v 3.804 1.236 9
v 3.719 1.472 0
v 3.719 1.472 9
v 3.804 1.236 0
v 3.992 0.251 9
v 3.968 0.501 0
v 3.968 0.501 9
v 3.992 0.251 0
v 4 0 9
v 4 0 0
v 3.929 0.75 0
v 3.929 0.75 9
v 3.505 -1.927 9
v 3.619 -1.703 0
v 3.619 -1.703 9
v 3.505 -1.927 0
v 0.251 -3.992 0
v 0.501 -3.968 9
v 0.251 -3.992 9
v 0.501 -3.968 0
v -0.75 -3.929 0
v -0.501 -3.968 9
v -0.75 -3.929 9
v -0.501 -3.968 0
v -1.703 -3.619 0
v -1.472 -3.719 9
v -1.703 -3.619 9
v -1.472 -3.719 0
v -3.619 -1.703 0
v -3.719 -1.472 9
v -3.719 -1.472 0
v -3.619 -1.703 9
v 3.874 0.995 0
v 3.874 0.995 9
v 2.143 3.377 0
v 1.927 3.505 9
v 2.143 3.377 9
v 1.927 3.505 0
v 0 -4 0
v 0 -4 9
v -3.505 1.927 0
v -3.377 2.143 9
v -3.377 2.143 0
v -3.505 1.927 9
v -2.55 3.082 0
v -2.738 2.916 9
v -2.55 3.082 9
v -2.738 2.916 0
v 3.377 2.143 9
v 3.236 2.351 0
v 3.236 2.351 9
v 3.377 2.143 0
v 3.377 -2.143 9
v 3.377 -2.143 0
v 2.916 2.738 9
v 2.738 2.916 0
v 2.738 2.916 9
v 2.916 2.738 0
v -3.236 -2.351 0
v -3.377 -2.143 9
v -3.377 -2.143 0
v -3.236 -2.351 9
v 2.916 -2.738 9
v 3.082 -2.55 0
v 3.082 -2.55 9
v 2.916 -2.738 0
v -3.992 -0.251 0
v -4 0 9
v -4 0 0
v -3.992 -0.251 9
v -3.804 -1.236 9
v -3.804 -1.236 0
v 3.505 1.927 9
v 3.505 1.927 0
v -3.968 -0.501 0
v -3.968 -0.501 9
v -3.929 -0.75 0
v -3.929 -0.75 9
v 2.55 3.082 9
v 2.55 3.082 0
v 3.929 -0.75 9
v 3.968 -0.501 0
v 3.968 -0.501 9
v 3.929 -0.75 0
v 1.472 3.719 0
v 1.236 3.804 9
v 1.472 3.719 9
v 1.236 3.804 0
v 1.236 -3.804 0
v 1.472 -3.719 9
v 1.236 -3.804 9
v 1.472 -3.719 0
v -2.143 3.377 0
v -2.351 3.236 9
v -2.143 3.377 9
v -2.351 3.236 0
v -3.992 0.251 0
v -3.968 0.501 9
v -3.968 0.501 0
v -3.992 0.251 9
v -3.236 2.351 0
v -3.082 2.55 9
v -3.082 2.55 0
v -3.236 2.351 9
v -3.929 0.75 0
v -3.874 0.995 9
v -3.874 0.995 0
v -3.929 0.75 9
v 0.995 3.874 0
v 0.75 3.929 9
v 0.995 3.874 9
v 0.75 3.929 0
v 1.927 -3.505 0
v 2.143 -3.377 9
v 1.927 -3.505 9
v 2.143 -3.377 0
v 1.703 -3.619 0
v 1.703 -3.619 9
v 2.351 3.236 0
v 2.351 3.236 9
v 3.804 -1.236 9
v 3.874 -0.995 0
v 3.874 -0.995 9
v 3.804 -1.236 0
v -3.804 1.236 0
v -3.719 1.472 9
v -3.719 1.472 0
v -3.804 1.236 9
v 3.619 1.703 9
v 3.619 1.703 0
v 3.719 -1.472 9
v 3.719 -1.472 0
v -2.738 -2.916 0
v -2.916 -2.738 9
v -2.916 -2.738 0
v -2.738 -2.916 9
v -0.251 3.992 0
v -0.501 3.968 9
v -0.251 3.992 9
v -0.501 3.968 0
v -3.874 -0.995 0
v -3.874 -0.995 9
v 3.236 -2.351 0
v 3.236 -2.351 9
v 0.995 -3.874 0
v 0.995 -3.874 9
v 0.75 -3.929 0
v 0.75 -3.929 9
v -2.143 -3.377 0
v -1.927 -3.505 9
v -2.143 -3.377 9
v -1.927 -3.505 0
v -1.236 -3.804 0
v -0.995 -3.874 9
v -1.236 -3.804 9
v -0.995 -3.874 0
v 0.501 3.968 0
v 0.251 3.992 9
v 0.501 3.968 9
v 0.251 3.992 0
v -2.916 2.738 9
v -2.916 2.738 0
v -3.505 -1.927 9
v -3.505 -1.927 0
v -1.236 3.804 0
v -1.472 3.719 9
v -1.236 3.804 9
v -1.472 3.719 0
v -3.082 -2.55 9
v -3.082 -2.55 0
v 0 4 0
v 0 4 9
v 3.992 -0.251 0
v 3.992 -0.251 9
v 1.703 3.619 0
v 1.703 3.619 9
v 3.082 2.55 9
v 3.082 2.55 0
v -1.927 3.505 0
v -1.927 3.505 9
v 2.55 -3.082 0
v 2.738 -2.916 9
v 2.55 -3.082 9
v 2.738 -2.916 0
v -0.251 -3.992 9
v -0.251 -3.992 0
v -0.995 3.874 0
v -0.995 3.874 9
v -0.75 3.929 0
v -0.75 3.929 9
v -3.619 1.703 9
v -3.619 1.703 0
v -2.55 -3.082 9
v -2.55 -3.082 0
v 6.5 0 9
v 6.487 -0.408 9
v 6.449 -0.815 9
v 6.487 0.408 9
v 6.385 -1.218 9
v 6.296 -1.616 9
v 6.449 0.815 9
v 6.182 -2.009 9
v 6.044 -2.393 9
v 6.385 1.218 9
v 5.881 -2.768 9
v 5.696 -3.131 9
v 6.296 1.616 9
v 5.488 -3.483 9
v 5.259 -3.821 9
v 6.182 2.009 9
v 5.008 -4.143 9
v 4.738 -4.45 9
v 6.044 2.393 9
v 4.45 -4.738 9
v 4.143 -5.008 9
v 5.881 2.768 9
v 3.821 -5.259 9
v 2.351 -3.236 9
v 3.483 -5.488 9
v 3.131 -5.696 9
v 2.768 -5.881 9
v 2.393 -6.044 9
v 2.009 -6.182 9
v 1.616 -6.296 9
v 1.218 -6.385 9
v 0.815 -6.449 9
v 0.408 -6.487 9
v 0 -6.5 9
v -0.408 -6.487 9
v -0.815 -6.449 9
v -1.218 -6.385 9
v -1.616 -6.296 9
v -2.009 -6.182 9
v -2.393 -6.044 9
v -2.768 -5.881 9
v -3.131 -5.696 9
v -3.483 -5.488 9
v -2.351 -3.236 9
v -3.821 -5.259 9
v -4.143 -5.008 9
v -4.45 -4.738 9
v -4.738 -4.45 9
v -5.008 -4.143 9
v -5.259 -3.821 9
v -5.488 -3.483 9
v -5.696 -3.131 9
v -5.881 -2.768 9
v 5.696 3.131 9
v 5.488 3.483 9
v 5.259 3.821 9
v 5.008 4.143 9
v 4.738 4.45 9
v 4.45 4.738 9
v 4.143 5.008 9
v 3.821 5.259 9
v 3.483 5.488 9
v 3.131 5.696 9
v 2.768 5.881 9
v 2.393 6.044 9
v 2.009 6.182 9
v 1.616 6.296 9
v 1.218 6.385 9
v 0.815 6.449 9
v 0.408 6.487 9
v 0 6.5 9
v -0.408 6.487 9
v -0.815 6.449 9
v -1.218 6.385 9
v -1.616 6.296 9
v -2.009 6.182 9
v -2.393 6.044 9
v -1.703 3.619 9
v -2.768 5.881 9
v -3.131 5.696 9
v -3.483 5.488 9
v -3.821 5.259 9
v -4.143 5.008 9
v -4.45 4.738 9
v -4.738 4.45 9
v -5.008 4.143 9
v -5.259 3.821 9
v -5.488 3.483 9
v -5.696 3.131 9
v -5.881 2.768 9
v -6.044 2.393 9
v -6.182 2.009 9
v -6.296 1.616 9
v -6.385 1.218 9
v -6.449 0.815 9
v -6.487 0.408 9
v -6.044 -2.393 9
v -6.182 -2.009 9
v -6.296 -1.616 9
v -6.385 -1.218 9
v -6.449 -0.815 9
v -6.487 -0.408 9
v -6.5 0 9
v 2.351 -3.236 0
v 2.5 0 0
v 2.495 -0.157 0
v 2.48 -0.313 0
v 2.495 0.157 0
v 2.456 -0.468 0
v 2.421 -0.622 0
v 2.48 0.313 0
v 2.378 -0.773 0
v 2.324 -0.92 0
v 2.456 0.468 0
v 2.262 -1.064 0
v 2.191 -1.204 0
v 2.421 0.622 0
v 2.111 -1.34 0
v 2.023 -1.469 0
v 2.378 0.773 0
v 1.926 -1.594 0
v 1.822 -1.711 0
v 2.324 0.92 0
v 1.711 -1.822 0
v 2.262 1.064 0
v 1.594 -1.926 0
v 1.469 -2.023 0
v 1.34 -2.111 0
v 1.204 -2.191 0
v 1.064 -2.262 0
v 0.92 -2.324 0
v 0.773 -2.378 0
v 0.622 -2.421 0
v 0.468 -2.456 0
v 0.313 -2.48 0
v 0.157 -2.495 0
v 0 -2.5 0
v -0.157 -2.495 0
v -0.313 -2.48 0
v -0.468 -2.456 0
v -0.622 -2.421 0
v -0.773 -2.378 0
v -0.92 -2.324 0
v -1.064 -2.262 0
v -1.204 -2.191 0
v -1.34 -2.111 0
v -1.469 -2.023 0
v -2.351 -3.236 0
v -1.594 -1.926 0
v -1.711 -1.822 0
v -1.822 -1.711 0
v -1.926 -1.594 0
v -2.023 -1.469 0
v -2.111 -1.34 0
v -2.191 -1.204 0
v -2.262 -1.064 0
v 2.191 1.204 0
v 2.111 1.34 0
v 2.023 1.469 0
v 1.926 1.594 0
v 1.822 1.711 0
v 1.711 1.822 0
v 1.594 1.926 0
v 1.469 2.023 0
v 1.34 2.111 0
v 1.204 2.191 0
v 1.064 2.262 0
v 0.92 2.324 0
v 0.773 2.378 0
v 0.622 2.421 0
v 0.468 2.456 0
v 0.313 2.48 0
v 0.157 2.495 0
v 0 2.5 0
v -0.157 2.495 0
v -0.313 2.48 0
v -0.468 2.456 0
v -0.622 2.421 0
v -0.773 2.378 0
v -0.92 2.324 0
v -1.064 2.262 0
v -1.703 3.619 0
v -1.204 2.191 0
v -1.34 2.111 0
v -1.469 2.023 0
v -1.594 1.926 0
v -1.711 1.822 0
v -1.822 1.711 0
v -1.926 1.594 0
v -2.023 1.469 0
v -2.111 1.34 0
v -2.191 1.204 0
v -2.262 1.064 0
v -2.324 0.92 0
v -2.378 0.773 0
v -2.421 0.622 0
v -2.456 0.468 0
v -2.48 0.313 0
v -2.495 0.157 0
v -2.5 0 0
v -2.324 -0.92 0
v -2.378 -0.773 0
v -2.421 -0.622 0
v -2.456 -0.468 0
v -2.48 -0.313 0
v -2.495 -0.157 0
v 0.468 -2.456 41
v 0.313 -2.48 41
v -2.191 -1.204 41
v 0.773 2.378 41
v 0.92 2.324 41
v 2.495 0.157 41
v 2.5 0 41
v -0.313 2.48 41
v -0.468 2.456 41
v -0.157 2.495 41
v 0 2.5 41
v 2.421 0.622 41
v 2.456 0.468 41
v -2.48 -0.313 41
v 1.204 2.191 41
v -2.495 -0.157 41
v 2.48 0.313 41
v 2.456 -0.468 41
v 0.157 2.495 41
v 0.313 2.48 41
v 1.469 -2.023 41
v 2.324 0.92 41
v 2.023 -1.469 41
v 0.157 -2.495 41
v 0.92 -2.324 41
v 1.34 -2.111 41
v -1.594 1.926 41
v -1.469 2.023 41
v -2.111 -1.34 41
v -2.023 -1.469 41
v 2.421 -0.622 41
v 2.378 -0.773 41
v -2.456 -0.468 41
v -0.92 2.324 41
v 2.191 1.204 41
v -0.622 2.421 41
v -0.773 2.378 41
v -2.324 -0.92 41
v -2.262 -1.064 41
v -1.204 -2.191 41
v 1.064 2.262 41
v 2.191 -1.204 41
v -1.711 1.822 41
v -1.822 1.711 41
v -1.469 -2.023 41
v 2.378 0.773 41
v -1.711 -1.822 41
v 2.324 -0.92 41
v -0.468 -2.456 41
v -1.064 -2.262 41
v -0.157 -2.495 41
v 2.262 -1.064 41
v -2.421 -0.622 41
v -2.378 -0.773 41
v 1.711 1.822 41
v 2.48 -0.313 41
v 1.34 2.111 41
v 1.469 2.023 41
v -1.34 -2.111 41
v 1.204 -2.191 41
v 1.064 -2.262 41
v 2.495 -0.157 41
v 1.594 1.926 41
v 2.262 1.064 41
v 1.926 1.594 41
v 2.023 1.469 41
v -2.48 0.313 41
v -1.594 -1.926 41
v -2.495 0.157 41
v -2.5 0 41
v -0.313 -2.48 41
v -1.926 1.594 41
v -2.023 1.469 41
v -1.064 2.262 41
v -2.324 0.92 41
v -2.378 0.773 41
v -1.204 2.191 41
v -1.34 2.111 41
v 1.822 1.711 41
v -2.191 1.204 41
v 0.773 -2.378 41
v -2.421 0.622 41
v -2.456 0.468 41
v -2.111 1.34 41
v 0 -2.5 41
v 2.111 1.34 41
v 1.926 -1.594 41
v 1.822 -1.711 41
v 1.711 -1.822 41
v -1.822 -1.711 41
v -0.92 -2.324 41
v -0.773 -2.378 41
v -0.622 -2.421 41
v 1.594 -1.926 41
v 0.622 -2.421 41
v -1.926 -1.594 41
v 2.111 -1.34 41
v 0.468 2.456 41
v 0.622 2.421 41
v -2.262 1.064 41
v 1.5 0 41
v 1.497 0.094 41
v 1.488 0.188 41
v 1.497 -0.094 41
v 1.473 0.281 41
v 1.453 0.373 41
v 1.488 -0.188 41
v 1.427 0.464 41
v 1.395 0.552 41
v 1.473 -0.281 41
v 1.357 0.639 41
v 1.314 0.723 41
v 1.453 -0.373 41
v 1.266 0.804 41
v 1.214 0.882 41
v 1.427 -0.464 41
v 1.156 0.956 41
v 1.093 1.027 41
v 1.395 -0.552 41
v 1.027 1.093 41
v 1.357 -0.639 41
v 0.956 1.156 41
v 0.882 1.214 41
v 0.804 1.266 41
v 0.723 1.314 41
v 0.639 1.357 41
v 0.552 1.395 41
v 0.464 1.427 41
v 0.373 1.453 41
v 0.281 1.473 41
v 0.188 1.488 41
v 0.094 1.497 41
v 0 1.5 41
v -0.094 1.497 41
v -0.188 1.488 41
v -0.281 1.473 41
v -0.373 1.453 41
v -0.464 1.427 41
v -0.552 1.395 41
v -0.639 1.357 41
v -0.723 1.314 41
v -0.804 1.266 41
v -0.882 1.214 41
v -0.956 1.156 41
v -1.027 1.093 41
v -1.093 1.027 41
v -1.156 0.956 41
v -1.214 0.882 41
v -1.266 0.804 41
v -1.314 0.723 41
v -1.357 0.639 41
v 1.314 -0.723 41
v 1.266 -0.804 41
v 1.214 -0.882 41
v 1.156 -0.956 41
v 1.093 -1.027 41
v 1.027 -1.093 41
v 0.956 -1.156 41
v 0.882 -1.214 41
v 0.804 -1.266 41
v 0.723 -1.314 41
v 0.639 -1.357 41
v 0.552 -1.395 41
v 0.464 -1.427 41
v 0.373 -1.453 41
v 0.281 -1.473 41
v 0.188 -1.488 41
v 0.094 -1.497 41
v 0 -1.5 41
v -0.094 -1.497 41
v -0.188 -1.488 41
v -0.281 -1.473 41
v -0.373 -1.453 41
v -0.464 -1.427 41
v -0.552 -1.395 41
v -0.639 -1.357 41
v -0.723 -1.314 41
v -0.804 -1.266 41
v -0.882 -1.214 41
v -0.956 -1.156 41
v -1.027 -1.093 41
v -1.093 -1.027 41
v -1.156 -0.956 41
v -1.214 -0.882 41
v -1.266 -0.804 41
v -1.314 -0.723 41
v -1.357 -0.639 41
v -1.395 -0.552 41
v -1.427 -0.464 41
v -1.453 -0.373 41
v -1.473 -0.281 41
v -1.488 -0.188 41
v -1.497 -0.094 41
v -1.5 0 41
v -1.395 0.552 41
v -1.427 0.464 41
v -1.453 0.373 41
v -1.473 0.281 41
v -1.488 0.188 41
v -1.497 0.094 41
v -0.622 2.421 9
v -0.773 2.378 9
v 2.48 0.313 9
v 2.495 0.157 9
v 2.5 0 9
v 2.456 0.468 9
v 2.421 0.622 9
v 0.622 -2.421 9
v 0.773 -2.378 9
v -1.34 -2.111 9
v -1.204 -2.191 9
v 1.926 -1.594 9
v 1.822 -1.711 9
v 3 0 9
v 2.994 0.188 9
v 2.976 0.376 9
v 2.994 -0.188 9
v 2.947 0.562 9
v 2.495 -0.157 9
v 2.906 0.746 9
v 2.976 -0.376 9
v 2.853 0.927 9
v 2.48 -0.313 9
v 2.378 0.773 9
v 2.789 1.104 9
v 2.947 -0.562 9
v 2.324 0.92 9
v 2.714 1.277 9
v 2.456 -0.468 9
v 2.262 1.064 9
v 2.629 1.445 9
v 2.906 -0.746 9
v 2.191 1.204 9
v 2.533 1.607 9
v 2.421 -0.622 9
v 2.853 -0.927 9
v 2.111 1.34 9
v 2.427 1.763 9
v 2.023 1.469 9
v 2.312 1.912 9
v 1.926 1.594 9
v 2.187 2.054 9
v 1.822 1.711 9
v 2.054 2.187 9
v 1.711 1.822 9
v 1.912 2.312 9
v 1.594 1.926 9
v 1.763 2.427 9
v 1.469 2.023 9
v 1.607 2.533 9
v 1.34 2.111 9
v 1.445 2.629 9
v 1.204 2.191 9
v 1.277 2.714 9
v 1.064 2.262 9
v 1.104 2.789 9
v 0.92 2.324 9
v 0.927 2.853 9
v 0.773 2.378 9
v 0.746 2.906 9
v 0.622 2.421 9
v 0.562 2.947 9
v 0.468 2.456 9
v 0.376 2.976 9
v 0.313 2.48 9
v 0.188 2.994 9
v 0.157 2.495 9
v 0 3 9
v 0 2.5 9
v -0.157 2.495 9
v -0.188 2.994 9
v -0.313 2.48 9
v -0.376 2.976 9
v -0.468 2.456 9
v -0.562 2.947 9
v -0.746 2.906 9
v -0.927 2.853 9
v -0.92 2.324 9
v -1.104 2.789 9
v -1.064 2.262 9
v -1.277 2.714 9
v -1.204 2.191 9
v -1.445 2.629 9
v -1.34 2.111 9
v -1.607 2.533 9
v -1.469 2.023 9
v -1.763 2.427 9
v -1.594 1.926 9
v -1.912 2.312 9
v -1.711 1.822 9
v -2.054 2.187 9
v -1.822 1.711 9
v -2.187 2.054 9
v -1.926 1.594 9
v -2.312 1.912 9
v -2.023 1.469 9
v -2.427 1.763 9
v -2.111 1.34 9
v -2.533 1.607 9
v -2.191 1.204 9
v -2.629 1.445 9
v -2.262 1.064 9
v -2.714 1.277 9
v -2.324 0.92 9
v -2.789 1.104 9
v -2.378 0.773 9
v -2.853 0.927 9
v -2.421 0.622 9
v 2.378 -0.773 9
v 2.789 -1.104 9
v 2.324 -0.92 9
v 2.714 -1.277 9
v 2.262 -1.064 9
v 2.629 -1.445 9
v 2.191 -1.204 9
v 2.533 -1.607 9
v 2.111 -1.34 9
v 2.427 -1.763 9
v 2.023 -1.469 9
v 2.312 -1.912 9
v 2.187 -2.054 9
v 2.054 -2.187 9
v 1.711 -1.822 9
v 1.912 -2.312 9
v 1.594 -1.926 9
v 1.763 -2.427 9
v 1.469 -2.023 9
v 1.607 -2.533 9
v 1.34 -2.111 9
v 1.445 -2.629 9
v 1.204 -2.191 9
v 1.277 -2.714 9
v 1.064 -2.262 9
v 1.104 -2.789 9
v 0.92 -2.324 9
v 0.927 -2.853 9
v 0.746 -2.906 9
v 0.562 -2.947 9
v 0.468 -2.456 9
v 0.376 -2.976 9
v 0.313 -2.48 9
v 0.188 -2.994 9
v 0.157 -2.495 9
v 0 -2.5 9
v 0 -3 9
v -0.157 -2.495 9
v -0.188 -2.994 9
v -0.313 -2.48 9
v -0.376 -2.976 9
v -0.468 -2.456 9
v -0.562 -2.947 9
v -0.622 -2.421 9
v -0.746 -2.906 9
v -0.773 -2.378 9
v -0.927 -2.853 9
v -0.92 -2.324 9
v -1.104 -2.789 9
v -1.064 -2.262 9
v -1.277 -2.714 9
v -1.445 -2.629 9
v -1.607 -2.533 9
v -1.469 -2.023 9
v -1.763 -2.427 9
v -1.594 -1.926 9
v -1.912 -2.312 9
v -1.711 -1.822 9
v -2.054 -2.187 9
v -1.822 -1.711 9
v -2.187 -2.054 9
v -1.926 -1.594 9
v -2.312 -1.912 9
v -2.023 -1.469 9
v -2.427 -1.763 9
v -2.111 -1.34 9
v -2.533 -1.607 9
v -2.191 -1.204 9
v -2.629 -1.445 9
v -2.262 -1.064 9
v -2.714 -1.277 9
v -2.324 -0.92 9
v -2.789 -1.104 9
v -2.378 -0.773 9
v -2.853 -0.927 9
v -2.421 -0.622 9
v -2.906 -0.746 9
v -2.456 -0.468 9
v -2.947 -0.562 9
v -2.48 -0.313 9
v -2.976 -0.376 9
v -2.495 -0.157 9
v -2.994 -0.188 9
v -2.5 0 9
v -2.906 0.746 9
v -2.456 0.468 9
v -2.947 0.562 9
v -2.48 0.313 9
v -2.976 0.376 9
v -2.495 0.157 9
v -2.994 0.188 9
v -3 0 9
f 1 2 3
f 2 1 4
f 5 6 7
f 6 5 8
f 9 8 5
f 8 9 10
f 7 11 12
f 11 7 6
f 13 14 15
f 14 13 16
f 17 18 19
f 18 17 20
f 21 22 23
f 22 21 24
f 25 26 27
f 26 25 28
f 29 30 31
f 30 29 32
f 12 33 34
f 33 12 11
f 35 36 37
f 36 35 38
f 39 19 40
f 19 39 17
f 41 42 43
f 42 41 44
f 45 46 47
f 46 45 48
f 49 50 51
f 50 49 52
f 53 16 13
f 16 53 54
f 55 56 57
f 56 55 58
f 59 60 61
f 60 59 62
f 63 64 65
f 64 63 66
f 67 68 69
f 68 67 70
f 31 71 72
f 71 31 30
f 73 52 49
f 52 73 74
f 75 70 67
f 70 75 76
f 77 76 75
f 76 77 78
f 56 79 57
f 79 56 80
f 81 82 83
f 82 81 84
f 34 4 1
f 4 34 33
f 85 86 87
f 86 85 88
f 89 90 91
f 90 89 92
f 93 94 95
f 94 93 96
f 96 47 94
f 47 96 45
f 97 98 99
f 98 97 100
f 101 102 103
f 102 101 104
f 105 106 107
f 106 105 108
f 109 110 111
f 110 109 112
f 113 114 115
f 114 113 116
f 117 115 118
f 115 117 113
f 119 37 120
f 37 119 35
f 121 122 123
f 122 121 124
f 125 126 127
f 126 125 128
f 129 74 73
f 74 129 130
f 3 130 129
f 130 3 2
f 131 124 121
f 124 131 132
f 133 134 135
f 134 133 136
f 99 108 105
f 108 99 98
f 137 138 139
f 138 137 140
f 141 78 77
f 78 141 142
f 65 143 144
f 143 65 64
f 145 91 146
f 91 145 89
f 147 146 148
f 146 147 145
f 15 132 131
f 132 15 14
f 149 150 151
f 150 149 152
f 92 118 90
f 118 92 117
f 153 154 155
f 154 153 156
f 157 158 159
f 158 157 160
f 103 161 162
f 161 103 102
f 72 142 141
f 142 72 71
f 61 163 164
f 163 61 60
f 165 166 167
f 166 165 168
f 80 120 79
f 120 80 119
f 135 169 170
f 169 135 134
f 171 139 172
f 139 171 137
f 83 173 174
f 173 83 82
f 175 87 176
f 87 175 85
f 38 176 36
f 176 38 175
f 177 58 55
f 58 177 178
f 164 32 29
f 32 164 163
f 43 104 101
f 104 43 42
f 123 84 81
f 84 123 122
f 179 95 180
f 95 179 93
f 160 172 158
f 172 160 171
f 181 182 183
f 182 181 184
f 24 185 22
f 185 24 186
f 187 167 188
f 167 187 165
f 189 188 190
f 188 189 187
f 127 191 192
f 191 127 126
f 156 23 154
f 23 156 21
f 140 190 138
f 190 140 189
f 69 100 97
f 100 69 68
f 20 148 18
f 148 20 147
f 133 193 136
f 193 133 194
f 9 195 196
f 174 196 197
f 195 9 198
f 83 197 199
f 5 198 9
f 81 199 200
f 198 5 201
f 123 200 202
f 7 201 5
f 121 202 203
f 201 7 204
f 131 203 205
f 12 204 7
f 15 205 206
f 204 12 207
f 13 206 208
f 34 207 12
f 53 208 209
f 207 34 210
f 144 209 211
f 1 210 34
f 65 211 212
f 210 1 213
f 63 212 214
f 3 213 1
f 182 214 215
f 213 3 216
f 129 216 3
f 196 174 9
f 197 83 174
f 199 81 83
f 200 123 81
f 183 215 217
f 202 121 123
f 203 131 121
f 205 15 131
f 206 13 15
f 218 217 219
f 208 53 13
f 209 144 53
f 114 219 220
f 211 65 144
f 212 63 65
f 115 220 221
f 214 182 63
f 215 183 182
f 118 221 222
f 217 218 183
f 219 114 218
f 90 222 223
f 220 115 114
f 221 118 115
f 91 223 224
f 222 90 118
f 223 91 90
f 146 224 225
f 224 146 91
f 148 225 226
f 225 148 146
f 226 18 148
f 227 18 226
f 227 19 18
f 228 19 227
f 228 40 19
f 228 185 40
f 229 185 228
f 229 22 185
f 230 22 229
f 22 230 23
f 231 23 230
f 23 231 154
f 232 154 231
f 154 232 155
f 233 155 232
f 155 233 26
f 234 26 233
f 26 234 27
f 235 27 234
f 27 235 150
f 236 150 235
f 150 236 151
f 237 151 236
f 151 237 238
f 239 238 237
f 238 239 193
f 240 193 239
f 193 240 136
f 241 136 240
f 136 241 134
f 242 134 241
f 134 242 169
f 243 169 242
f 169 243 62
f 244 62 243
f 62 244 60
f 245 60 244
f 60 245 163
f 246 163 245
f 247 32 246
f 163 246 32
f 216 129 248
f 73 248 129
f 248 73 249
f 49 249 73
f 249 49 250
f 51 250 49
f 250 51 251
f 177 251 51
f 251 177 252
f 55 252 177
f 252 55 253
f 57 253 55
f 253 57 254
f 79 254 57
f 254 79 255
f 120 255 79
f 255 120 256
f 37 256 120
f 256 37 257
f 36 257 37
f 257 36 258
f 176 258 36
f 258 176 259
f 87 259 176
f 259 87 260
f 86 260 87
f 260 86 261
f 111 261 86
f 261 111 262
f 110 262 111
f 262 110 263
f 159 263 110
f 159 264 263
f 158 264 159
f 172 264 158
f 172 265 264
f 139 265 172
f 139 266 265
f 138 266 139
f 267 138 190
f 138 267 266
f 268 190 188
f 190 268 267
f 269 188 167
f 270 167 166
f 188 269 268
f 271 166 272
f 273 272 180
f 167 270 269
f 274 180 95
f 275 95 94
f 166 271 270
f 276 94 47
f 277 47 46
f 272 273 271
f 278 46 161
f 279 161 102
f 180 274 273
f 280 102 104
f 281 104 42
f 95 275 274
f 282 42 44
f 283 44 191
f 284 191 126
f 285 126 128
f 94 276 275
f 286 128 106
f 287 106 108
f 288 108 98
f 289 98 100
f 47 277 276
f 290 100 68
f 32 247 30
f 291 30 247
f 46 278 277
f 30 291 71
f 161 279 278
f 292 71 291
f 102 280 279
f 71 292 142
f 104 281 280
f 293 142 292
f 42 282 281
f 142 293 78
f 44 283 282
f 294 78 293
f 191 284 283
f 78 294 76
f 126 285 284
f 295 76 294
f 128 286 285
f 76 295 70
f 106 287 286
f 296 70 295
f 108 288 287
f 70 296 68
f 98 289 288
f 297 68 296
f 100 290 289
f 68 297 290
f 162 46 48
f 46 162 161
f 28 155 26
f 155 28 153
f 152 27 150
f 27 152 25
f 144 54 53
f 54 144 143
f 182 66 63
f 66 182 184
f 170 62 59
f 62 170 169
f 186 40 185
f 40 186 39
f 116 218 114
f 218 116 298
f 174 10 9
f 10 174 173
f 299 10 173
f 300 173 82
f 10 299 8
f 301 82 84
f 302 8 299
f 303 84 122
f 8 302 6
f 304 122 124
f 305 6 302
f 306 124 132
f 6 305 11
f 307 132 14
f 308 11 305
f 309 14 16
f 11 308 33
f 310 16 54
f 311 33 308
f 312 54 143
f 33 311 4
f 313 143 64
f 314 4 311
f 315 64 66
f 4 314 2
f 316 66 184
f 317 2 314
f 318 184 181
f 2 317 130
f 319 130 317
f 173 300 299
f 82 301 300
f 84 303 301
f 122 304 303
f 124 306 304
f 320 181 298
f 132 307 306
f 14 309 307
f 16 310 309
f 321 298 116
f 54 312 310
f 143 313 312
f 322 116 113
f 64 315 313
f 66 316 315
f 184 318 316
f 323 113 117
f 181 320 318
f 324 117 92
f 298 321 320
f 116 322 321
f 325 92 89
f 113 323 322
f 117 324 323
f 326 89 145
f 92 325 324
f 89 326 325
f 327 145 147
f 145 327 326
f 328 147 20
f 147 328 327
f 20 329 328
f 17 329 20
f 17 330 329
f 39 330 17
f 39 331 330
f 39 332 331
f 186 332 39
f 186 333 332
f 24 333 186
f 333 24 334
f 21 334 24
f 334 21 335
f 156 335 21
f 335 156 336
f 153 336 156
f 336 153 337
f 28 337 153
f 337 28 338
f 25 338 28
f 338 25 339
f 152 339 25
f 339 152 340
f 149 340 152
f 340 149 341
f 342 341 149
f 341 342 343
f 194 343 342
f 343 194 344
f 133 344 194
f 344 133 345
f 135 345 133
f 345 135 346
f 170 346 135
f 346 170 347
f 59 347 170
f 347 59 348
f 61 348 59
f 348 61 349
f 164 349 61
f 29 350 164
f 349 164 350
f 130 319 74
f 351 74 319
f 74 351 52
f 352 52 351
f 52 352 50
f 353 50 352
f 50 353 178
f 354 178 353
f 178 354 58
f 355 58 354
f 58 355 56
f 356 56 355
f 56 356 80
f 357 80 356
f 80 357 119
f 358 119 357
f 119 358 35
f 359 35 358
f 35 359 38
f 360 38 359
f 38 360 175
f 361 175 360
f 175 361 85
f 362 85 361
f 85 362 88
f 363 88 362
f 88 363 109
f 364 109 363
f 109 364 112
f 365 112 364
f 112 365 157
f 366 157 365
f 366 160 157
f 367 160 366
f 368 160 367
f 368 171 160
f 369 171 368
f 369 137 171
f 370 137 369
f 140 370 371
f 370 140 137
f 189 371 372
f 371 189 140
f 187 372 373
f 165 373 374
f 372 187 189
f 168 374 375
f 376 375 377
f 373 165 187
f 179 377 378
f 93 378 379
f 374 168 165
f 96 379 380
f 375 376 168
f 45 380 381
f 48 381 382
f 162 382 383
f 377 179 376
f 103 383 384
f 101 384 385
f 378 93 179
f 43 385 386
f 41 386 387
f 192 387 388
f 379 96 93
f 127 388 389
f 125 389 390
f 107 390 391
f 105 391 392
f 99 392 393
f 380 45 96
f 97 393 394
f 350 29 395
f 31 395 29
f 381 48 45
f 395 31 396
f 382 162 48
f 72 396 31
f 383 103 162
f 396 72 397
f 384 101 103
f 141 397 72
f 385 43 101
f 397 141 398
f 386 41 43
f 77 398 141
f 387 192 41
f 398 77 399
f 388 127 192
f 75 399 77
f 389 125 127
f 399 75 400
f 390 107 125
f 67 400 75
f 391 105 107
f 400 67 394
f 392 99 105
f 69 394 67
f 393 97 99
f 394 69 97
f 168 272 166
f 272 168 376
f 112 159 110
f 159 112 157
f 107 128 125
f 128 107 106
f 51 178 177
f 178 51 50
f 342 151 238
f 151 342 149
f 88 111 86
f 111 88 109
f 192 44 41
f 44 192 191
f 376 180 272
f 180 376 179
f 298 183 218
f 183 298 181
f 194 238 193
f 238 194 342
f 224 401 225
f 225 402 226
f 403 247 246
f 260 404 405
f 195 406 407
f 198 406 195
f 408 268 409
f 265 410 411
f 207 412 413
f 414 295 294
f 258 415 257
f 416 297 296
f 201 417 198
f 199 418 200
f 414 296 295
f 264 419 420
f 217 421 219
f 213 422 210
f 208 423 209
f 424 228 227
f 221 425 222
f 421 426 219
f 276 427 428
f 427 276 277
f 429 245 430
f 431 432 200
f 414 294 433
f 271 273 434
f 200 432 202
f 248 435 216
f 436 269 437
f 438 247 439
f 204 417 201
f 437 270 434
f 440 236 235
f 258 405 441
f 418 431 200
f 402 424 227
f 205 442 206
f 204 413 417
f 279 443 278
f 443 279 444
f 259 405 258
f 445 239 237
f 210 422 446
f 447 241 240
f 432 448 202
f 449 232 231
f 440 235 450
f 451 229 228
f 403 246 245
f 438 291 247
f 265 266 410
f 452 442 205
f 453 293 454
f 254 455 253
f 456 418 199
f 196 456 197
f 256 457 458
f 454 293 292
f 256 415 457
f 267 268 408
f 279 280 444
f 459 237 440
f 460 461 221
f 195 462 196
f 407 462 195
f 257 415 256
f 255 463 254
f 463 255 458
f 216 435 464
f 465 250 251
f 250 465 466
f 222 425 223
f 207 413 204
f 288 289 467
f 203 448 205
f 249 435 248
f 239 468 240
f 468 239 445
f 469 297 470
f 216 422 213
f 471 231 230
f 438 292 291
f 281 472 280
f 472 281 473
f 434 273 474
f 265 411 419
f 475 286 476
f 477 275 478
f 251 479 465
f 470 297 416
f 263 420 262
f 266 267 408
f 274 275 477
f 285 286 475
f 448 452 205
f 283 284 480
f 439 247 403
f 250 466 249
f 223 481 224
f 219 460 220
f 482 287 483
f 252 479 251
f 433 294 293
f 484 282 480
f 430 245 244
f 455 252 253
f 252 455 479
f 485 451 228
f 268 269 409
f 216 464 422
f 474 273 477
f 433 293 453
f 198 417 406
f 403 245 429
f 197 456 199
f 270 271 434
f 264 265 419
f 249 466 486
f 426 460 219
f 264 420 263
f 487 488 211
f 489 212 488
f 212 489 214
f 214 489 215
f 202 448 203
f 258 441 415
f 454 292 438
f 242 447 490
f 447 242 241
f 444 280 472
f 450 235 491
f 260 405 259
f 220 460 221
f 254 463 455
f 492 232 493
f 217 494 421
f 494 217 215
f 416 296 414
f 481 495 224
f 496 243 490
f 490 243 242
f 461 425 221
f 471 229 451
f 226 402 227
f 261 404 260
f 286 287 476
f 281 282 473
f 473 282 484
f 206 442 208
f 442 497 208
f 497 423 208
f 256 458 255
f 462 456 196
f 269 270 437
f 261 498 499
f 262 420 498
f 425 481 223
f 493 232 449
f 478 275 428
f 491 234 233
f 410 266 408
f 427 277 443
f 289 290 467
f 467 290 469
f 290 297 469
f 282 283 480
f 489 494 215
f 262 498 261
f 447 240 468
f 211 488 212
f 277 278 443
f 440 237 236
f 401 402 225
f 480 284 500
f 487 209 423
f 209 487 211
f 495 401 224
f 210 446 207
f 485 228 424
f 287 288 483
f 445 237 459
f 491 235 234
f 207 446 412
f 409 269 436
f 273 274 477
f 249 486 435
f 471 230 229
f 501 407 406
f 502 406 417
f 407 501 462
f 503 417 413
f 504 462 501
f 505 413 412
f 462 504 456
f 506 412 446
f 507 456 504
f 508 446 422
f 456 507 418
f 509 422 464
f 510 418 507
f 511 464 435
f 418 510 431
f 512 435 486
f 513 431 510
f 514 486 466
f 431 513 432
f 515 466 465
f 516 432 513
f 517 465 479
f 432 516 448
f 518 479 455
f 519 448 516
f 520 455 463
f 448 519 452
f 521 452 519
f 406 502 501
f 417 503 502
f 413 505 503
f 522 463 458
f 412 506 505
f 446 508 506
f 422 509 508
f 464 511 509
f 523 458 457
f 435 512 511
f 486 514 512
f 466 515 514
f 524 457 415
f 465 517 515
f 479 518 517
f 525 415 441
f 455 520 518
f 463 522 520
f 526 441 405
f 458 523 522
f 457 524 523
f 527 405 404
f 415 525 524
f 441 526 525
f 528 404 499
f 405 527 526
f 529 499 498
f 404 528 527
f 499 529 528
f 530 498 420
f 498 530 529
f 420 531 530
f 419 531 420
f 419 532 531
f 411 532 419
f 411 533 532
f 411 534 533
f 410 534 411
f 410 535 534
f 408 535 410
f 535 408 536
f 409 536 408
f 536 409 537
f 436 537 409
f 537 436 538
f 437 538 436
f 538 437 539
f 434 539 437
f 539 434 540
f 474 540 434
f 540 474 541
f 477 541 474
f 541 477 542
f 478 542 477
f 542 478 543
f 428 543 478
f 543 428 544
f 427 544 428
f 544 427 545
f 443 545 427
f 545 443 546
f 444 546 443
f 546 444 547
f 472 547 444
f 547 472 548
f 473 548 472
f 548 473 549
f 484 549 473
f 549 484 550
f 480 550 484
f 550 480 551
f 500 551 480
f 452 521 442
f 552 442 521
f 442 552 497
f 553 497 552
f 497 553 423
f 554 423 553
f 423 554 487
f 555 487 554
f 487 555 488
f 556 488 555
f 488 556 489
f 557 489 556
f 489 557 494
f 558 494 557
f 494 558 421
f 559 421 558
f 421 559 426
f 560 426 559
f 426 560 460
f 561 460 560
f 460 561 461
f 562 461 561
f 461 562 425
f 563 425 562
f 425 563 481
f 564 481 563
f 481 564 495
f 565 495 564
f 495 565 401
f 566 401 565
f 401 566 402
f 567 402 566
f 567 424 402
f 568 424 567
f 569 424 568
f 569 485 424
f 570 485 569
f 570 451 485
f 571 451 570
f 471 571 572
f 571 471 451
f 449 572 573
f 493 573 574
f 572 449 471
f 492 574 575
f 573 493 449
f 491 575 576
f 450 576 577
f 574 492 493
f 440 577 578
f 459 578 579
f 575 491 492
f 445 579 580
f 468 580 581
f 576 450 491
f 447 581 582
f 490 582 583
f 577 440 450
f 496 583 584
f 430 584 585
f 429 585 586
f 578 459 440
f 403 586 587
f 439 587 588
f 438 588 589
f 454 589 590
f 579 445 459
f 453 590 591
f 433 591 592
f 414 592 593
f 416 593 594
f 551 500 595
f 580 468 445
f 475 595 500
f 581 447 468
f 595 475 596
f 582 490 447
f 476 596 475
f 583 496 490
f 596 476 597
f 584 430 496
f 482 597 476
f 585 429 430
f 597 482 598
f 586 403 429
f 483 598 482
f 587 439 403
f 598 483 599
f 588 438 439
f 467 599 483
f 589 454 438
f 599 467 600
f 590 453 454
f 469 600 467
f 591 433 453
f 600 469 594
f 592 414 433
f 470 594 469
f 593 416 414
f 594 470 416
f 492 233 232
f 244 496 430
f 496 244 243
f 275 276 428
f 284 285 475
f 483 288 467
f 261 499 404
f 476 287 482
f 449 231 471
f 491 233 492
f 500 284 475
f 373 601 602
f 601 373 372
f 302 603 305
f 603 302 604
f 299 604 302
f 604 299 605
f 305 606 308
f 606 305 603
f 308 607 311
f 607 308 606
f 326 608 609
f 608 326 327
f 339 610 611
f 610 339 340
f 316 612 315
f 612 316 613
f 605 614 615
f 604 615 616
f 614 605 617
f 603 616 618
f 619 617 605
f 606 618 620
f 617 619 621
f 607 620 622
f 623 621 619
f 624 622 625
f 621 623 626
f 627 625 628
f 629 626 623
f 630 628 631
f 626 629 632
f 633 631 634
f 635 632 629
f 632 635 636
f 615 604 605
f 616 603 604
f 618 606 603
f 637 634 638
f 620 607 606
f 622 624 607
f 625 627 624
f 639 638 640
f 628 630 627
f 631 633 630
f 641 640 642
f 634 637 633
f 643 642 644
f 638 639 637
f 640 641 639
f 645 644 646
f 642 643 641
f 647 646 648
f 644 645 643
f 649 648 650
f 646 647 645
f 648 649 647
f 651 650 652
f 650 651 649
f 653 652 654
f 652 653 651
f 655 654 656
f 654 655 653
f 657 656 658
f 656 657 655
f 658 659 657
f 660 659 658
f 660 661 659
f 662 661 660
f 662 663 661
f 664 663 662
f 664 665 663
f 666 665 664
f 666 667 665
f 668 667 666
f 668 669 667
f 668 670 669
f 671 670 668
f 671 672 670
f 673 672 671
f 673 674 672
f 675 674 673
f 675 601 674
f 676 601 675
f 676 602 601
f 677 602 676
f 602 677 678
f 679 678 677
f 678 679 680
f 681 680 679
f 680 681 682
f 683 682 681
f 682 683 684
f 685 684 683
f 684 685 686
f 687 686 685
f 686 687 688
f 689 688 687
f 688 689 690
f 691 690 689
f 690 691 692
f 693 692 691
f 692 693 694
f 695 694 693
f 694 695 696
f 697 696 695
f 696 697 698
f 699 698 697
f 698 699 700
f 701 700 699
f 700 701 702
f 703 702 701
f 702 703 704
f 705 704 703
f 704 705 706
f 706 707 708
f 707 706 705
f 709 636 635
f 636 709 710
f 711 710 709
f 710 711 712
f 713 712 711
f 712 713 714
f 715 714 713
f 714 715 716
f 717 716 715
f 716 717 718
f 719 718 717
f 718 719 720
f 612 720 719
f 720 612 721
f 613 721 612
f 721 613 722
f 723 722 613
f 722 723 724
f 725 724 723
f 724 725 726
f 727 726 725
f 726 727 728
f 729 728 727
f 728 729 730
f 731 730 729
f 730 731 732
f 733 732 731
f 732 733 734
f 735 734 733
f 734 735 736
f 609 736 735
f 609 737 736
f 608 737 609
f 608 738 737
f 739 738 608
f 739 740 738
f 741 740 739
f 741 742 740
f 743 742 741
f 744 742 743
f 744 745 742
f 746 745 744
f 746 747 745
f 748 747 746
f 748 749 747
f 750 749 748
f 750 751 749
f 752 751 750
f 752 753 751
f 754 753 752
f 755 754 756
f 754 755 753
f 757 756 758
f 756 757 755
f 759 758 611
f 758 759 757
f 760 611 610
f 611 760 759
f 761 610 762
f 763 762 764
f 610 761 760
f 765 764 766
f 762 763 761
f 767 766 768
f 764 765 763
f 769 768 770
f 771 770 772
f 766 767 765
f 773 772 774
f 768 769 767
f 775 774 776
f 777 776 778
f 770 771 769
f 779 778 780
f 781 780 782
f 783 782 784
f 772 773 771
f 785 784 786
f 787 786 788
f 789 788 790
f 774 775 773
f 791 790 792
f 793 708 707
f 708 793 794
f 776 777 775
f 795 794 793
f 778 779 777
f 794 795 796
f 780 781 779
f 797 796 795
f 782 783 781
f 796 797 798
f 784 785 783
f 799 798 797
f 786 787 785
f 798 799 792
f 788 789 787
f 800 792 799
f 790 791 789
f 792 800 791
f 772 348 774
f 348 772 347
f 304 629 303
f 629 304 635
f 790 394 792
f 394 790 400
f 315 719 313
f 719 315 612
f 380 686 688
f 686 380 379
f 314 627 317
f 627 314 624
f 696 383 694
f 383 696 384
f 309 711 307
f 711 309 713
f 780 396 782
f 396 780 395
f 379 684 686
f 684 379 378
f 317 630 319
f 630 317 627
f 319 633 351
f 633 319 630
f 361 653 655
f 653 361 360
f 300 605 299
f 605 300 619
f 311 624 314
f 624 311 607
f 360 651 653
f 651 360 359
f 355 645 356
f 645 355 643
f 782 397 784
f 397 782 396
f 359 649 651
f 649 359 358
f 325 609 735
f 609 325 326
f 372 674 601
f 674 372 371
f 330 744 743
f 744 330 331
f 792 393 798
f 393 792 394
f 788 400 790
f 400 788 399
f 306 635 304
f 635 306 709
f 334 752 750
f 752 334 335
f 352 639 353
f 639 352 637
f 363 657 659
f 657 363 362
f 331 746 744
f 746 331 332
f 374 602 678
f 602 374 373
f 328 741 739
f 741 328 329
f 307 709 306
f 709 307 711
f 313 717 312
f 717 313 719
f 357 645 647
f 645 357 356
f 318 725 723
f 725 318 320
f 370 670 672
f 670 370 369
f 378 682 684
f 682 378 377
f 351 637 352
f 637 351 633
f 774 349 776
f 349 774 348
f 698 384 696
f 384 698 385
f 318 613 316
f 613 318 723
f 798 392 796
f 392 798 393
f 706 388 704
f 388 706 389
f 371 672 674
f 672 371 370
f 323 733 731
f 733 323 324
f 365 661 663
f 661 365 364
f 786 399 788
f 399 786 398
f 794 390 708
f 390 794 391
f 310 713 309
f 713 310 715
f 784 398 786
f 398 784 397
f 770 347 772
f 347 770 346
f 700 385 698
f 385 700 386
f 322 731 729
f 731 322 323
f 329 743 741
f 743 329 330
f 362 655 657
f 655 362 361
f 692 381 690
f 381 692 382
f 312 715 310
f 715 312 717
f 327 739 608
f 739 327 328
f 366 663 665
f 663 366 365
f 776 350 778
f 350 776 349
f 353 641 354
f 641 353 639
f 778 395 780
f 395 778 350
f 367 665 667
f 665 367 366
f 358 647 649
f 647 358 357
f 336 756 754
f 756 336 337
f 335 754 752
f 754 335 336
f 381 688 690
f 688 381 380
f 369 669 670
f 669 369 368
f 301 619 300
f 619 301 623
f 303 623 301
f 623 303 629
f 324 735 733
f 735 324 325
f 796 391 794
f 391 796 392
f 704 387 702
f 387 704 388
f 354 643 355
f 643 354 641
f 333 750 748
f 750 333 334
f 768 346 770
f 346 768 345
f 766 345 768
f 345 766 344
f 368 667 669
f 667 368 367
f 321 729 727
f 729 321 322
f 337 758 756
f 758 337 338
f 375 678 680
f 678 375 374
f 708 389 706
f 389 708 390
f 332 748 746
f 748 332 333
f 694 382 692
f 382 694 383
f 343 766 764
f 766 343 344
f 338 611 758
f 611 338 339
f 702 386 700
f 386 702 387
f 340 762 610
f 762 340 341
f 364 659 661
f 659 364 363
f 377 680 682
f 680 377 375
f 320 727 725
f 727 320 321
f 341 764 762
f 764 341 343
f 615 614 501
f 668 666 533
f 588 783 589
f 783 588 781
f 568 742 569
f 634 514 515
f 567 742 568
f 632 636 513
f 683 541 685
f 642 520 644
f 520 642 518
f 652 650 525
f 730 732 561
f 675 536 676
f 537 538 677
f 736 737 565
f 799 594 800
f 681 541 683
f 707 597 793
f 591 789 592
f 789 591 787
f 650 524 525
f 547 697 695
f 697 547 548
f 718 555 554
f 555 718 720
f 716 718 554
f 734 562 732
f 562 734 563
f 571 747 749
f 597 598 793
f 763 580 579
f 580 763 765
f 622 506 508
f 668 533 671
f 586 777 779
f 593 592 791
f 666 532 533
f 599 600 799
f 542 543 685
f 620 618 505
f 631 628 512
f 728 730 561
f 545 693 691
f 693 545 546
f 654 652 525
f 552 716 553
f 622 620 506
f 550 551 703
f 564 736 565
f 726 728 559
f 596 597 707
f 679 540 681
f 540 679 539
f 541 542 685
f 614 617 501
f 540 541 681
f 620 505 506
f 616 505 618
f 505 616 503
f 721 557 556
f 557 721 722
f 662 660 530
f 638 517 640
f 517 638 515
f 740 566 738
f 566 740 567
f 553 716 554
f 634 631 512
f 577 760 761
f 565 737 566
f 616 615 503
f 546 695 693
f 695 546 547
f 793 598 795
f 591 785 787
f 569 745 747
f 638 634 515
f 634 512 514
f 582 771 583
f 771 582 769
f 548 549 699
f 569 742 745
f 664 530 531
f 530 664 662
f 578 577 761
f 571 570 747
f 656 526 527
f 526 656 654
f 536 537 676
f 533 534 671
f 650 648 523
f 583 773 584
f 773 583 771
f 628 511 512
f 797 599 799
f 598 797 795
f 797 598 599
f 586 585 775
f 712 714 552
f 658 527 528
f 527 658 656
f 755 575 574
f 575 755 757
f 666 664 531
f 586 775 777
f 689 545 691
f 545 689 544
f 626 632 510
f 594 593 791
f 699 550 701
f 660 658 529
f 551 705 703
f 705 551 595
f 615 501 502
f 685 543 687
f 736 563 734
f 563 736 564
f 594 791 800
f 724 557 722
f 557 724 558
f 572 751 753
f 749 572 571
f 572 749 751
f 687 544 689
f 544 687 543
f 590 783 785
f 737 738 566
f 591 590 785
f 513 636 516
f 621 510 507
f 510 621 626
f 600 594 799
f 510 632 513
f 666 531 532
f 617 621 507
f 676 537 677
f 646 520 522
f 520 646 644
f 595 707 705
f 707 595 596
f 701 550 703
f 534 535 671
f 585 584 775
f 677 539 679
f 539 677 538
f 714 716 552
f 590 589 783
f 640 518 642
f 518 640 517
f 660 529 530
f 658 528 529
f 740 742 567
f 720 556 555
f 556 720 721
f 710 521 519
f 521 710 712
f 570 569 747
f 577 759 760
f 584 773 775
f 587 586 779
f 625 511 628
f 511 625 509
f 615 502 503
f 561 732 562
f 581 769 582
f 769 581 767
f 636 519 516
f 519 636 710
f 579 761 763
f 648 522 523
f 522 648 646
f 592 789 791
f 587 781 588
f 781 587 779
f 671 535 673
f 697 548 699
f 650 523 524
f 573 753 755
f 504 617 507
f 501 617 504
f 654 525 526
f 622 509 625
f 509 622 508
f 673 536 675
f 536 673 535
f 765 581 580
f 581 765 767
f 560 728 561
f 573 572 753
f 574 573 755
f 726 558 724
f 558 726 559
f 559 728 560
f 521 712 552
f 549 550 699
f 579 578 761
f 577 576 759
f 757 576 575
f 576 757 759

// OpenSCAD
$fn=100;

difference() {
  union() {
    cylinder(h=9, d=8);
    translate([0, 0, 9]) cylinder(h=32, d1=13, d2=5);
  }
  union() {
    cylinder(h=9, d=5);
    translate([0, 0, 9]) cylinder(h=32, d1=6, d2=3);
  }
}
